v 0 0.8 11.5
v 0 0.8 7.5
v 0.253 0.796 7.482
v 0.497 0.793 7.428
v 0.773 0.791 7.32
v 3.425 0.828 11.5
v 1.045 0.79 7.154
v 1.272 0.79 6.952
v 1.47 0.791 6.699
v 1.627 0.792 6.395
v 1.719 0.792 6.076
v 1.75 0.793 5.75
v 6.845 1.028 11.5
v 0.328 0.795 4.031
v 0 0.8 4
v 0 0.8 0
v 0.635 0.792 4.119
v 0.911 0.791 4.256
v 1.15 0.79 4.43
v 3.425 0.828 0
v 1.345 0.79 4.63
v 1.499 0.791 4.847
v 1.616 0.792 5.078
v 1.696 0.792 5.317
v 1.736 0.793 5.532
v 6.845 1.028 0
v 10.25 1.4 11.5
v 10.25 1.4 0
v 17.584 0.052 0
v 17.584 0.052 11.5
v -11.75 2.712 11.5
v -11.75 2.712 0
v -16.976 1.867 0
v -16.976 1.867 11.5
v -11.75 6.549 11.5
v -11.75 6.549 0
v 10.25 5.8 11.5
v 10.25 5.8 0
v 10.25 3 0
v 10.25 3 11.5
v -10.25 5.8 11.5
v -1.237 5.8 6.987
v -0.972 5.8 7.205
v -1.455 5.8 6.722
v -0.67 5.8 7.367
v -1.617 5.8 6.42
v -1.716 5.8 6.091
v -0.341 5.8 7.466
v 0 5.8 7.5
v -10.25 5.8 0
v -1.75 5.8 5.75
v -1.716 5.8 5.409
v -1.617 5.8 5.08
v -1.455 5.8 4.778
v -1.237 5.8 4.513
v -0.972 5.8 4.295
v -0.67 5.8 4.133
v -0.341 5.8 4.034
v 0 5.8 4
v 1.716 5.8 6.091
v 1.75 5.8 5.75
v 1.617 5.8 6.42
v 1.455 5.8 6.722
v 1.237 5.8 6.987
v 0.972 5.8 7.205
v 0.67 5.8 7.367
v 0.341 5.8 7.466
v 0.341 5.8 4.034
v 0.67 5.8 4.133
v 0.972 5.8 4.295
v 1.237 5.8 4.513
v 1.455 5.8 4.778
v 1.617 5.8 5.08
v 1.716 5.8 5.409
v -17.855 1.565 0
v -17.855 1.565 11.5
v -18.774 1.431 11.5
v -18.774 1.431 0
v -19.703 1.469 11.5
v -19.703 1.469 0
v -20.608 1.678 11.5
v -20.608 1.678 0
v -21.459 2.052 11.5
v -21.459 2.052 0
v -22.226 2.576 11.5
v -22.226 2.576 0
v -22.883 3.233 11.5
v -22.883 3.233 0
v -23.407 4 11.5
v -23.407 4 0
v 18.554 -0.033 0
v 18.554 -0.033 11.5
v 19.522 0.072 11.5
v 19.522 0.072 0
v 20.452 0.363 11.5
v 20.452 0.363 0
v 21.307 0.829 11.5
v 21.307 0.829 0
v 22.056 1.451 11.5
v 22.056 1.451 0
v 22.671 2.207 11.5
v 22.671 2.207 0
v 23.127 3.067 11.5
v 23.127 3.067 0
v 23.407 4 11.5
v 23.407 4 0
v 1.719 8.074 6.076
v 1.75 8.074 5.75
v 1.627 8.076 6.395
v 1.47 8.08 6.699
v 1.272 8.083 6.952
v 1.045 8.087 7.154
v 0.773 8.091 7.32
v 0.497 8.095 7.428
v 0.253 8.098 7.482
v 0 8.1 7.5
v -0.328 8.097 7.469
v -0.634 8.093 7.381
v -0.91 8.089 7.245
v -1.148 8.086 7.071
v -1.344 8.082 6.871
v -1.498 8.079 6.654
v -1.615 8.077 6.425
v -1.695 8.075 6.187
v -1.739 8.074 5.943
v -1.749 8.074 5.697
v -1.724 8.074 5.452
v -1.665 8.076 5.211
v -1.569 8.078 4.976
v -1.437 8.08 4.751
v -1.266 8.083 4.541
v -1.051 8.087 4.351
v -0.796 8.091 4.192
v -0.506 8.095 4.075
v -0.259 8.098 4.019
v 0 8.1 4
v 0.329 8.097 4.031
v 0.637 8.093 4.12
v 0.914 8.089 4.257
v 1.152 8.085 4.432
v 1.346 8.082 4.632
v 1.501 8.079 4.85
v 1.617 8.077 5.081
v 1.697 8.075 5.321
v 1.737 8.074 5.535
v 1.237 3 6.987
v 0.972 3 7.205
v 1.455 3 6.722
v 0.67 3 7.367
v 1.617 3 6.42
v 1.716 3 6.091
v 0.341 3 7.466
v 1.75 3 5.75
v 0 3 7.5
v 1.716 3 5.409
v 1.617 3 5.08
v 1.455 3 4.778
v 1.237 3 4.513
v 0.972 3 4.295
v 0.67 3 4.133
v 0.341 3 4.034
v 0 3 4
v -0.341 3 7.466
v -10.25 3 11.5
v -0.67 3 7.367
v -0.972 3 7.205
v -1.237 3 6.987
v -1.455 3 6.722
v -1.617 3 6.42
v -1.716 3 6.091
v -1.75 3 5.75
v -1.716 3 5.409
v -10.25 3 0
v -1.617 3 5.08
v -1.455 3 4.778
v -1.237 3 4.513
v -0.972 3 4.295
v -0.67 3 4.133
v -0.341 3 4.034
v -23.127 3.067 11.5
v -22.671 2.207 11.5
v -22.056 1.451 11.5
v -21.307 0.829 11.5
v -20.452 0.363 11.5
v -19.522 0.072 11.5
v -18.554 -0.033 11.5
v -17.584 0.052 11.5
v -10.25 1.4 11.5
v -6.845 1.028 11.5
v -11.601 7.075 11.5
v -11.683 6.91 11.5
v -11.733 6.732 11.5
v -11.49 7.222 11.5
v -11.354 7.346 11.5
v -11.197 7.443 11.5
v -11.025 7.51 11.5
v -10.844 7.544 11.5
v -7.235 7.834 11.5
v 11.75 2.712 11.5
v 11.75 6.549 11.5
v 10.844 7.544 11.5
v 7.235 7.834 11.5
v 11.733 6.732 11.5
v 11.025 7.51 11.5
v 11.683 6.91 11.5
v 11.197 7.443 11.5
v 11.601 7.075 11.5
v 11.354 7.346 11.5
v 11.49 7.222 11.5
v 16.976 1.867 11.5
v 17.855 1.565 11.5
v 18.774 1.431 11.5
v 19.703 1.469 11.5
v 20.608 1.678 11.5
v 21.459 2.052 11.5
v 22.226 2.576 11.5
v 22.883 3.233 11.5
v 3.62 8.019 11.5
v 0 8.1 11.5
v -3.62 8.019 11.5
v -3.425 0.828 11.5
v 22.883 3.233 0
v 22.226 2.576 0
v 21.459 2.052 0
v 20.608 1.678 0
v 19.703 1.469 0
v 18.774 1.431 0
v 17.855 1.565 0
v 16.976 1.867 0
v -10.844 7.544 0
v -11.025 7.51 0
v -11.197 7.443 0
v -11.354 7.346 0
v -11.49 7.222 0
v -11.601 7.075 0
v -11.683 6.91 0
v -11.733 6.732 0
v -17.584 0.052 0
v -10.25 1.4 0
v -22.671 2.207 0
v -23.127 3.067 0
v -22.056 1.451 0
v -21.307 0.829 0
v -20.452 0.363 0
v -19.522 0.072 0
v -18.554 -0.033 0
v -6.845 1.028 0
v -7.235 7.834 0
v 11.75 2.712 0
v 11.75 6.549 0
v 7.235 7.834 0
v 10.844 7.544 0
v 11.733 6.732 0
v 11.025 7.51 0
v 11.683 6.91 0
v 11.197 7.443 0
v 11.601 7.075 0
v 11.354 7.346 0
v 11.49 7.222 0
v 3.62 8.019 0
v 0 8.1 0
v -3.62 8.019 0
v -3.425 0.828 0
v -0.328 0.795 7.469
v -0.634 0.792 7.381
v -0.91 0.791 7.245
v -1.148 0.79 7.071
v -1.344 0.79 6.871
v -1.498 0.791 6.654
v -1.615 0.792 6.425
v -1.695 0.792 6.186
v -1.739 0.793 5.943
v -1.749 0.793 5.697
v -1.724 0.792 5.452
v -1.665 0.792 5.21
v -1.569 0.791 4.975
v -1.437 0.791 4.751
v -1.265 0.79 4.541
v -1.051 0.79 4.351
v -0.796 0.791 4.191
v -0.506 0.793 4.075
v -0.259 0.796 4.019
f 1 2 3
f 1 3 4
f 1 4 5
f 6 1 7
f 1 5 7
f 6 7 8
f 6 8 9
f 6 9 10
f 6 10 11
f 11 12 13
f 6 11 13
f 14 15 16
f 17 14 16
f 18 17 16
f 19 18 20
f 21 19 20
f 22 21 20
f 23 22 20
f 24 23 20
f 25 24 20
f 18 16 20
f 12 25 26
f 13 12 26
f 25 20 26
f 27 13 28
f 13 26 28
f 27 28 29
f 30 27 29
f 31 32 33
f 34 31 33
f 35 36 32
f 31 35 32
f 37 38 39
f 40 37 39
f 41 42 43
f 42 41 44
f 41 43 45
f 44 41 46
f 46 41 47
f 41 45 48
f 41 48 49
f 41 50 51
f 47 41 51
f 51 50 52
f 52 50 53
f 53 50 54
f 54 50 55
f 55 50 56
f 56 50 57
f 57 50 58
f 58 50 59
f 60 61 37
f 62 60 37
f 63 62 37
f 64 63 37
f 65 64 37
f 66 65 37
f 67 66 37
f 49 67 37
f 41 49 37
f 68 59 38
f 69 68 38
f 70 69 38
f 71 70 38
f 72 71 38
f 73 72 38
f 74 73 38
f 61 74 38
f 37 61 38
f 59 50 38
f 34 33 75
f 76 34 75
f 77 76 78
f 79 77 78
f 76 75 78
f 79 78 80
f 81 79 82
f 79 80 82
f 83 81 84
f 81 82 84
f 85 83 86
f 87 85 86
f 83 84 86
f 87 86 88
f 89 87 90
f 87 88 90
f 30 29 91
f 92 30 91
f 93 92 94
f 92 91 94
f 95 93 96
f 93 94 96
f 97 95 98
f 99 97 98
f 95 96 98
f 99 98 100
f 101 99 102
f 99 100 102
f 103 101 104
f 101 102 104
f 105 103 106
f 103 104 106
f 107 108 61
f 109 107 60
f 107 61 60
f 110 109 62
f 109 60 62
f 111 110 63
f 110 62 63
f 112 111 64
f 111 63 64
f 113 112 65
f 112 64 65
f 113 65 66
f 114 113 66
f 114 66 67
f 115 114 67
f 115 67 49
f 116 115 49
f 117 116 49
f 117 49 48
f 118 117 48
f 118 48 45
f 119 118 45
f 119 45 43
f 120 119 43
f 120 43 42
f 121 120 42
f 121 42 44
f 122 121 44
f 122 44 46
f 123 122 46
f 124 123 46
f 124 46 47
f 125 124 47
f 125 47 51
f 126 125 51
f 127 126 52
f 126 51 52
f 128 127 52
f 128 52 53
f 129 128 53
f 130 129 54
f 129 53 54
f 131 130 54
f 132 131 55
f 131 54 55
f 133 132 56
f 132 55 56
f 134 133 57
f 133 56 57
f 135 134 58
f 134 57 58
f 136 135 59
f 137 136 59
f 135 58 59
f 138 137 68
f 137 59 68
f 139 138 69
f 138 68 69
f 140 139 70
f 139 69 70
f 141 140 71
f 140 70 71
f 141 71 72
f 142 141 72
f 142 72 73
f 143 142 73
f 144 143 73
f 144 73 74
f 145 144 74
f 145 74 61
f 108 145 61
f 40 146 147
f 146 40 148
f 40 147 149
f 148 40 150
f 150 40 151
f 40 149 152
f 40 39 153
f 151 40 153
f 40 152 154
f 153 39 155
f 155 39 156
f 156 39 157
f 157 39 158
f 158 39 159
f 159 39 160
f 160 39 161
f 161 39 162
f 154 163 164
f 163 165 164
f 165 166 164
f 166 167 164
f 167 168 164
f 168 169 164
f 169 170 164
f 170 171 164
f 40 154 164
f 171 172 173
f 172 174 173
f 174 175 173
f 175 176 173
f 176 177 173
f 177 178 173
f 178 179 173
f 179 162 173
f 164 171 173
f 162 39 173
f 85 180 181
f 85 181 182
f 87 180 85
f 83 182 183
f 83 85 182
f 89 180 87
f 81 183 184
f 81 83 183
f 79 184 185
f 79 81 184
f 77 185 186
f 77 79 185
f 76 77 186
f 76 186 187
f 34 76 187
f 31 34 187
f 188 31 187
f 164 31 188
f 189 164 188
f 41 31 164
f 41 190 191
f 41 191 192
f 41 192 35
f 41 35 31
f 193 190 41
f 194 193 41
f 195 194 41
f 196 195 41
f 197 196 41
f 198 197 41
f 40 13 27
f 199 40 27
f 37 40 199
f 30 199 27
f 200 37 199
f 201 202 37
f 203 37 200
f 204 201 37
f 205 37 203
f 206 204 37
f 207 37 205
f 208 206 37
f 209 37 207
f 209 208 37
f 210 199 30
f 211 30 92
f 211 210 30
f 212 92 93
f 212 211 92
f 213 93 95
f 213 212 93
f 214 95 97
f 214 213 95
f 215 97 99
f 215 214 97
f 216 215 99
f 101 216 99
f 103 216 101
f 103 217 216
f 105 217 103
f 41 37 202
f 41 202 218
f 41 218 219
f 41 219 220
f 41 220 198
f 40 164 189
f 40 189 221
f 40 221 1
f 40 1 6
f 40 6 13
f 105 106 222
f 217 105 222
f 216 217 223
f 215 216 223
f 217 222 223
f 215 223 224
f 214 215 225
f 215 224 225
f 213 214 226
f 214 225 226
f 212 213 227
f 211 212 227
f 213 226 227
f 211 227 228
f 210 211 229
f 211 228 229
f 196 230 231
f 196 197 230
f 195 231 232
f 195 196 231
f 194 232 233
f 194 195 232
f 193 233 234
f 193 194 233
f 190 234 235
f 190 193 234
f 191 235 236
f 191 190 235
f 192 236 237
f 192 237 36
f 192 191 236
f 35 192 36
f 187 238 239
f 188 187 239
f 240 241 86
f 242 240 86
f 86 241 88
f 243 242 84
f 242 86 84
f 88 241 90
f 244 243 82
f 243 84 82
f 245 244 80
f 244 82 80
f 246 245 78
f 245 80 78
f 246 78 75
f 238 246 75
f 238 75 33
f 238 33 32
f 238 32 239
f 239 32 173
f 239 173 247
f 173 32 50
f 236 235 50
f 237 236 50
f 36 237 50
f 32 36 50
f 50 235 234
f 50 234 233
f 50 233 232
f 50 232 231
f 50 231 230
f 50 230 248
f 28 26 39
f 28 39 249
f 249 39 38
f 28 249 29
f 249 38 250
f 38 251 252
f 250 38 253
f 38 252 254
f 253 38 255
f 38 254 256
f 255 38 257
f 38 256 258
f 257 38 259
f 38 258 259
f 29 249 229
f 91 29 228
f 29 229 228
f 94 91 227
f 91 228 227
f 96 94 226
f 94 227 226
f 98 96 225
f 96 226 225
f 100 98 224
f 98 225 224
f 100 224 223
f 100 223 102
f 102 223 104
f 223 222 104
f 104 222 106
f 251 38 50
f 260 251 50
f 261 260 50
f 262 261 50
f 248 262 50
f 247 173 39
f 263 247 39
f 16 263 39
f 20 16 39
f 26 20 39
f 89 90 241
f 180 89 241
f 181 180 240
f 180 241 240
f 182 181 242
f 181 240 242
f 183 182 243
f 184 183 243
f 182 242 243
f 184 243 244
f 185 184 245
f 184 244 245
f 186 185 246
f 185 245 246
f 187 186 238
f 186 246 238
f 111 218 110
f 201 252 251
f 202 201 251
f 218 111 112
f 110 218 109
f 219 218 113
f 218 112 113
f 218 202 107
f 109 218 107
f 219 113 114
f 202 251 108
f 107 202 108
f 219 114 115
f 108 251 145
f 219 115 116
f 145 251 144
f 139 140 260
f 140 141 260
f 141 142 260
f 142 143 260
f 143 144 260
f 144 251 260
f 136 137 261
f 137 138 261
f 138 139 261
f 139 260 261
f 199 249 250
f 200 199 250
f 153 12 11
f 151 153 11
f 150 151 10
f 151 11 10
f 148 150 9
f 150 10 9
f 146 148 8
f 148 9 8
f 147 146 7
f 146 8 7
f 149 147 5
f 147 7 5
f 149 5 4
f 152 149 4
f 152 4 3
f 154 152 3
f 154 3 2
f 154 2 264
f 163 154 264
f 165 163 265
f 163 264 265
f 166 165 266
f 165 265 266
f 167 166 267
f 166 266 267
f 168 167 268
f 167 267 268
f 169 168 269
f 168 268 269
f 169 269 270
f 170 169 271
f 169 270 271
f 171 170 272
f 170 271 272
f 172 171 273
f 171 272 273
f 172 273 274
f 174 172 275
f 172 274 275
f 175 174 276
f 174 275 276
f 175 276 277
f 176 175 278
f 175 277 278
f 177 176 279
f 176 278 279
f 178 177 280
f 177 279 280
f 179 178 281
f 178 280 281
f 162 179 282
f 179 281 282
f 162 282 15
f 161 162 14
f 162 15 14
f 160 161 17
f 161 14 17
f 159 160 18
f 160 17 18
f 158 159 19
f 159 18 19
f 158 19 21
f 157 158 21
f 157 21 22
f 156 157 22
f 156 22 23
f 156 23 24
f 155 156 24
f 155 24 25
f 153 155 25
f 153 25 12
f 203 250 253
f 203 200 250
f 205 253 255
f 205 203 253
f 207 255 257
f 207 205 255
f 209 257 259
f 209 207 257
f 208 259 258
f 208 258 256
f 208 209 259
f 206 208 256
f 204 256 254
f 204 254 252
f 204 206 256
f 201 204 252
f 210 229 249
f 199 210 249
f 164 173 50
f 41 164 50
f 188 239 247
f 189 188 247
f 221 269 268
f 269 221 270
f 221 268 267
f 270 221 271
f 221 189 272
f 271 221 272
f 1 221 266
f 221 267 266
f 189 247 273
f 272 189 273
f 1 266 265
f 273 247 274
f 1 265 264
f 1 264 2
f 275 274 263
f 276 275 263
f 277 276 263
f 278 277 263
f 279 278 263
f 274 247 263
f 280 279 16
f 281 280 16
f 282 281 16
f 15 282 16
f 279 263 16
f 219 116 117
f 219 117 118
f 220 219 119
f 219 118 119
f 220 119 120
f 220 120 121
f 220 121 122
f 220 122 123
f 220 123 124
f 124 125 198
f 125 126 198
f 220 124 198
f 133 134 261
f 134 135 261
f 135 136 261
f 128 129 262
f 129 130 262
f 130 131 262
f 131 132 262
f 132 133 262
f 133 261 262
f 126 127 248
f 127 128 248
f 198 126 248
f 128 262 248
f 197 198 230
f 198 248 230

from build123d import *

# Parameters (mm, degrees)
F1_DEPTH = 11.5
F2_R     = 1.75
F3_DEPTH = 25
F4_R     = 1


with BuildPart() as f1:
    # F0 (on Top) → F1 (new body)
    with BuildSketch(Plane.XY):
        with BuildLine():
            ThreePointArc((0, 0.8), (5.13633, 0.906445), (10.25, 1.4))
            Line((10.25, 1.4), (17.584028, 0.051845))
            ThreePointArc((17.584028, 0.051845), (21.307427, 0.828514), (23.407092, 4))
            ThreePointArc((23.407092, 4), (20.608046, 1.678425), (16.976419, 1.867262))
            Line((16.976419, 1.867262), (11.75, 2.712208))
            Line((11.75, 2.712208), (11.75, 7.455321))
            ThreePointArc((11.75, 7.455321), (5.882541, 7.915111), (0, 8.1))
            ThreePointArc((0, 8.1), (-5.882541, 7.915111), (-11.75, 7.455321))
            Line((-11.75, 7.455321), (-11.75, 2.712208))
            Line((-11.75, 2.712208), (-16.976419, 1.867262))
            ThreePointArc((-16.976419, 1.867262), (-20.608046, 1.678425), (-23.407092, 4))
            ThreePointArc((-23.407092, 4), (-21.307427, 0.828514), (-17.584028, 0.051845))
            Line((-17.584028, 0.051845), (-10.25, 1.4))
            ThreePointArc((-10.25, 1.4), (-5.13633, 0.906445), (0, 0.8))
        make_face()
        Polygon((10.25, 5.8), (10.25, 3), (0, 3), (-10.25, 3), (-10.25, 5.8), (0, 5.8), align=None, mode=Mode.SUBTRACT)
    extrude(amount=F1_DEPTH)

    # F2 (on Front) → F3 (cut)
    with BuildSketch(Plane.XZ):
        with Locations((0, 5.75)):
            Circle(F2_R)
    extrude(amount=-F3_DEPTH, mode=Mode.SUBTRACT)

    # F4
    f4_edges = [f1.edges().sort_by_distance(p)[0] for p in [
        (-11.75, 7.455321, 5.75),
        (11.75, 7.455321, 5.75),
    ]]
    fillet(f4_edges, radius=F4_R)


solid = f1.part
